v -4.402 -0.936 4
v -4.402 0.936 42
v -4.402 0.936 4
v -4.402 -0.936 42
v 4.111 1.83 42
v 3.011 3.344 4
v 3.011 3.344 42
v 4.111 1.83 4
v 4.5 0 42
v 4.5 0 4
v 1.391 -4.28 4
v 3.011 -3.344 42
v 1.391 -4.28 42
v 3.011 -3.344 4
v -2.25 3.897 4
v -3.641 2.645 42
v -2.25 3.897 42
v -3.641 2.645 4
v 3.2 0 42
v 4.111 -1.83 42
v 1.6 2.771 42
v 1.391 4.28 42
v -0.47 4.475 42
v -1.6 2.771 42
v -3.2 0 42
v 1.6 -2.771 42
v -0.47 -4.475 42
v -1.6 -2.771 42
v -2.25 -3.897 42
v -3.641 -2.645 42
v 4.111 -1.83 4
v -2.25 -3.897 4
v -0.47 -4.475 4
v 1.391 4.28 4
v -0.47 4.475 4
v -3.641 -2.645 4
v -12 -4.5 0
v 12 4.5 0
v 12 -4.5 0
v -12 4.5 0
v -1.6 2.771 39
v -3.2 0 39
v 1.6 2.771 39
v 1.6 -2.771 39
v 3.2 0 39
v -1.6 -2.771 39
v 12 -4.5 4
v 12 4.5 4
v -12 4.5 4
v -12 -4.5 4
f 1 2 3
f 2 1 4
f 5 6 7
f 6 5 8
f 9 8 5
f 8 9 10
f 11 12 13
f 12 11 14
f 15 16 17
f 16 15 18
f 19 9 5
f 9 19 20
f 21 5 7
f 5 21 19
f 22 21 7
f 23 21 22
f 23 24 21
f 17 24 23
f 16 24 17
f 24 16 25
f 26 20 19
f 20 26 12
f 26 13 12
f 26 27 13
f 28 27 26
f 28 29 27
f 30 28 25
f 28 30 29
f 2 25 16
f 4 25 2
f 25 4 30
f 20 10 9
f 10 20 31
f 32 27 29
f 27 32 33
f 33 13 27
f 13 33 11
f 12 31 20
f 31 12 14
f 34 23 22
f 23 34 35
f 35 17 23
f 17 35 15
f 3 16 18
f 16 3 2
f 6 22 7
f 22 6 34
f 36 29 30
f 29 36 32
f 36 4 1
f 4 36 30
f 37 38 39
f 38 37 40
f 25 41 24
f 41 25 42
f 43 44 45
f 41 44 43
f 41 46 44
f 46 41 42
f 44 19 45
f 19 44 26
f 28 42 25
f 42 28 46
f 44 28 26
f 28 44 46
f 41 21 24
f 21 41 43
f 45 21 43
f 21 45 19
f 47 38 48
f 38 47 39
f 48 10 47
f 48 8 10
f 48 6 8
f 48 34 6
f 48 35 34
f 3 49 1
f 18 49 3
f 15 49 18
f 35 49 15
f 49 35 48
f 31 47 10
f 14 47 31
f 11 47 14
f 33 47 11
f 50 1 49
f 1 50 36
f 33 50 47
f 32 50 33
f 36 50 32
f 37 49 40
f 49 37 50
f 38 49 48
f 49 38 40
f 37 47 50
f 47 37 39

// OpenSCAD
// Copyright 2018 Marcos Del Sol Vives
// SPDX-License-Identifier: ISC

module regular_polygon(order, r=1){
	angles=[ for (i = [0 : order - 1]) i * (360 / order) ];
	coords=[ for (th = angles) [r * cos(th), r * sin(th)] ];
	polygon(coords);
}

translate([-12, -4.5, 0]) {
	cube([24, 9, 4]);
}

difference() {
	cylinder(r=4.5, h=42);
	translate([0, 0, 39]) {
		linear_extrude(3) {
			regular_polygon(6, r=3.2);
		}
	}
}
